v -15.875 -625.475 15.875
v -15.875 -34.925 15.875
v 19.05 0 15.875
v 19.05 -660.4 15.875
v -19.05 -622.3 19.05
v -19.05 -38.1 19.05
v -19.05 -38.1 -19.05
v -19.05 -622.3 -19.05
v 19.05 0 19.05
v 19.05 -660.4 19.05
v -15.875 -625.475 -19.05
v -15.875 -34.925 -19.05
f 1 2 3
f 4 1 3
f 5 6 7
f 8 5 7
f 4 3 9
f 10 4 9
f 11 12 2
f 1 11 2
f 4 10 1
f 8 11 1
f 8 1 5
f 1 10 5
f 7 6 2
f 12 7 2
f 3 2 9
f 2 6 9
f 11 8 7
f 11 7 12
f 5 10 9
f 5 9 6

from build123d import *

# Parameters (mm, degrees)
F1_DEPTH = 660.4
F3_DEPTH = 38.101


with BuildPart() as f1:
    # F0 (on Front) → F1 (new body)
    with BuildSketch(Plane.XZ):
        Polygon((19.05, 15.875), (19.05, 19.05), (-19.05, 19.05), (-19.05, -19.05), (-15.875, -19.05), (-15.875, 15.875), align=None)
    extrude(amount=F1_DEPTH)

    # F2 (on face) → F3 (cut, through all)
    with BuildSketch(Plane.XY.offset(19.05)):
        Polygon((-19.05, -660.4), (19.05, -660.4), (-19.05, -622.3), align=None)
        Polygon((-19.05, -38.1), (19.05, 0), (-19.05, 0), align=None)
    extrude(amount=-F3_DEPTH, mode=Mode.SUBTRACT)


solid = f1.part
